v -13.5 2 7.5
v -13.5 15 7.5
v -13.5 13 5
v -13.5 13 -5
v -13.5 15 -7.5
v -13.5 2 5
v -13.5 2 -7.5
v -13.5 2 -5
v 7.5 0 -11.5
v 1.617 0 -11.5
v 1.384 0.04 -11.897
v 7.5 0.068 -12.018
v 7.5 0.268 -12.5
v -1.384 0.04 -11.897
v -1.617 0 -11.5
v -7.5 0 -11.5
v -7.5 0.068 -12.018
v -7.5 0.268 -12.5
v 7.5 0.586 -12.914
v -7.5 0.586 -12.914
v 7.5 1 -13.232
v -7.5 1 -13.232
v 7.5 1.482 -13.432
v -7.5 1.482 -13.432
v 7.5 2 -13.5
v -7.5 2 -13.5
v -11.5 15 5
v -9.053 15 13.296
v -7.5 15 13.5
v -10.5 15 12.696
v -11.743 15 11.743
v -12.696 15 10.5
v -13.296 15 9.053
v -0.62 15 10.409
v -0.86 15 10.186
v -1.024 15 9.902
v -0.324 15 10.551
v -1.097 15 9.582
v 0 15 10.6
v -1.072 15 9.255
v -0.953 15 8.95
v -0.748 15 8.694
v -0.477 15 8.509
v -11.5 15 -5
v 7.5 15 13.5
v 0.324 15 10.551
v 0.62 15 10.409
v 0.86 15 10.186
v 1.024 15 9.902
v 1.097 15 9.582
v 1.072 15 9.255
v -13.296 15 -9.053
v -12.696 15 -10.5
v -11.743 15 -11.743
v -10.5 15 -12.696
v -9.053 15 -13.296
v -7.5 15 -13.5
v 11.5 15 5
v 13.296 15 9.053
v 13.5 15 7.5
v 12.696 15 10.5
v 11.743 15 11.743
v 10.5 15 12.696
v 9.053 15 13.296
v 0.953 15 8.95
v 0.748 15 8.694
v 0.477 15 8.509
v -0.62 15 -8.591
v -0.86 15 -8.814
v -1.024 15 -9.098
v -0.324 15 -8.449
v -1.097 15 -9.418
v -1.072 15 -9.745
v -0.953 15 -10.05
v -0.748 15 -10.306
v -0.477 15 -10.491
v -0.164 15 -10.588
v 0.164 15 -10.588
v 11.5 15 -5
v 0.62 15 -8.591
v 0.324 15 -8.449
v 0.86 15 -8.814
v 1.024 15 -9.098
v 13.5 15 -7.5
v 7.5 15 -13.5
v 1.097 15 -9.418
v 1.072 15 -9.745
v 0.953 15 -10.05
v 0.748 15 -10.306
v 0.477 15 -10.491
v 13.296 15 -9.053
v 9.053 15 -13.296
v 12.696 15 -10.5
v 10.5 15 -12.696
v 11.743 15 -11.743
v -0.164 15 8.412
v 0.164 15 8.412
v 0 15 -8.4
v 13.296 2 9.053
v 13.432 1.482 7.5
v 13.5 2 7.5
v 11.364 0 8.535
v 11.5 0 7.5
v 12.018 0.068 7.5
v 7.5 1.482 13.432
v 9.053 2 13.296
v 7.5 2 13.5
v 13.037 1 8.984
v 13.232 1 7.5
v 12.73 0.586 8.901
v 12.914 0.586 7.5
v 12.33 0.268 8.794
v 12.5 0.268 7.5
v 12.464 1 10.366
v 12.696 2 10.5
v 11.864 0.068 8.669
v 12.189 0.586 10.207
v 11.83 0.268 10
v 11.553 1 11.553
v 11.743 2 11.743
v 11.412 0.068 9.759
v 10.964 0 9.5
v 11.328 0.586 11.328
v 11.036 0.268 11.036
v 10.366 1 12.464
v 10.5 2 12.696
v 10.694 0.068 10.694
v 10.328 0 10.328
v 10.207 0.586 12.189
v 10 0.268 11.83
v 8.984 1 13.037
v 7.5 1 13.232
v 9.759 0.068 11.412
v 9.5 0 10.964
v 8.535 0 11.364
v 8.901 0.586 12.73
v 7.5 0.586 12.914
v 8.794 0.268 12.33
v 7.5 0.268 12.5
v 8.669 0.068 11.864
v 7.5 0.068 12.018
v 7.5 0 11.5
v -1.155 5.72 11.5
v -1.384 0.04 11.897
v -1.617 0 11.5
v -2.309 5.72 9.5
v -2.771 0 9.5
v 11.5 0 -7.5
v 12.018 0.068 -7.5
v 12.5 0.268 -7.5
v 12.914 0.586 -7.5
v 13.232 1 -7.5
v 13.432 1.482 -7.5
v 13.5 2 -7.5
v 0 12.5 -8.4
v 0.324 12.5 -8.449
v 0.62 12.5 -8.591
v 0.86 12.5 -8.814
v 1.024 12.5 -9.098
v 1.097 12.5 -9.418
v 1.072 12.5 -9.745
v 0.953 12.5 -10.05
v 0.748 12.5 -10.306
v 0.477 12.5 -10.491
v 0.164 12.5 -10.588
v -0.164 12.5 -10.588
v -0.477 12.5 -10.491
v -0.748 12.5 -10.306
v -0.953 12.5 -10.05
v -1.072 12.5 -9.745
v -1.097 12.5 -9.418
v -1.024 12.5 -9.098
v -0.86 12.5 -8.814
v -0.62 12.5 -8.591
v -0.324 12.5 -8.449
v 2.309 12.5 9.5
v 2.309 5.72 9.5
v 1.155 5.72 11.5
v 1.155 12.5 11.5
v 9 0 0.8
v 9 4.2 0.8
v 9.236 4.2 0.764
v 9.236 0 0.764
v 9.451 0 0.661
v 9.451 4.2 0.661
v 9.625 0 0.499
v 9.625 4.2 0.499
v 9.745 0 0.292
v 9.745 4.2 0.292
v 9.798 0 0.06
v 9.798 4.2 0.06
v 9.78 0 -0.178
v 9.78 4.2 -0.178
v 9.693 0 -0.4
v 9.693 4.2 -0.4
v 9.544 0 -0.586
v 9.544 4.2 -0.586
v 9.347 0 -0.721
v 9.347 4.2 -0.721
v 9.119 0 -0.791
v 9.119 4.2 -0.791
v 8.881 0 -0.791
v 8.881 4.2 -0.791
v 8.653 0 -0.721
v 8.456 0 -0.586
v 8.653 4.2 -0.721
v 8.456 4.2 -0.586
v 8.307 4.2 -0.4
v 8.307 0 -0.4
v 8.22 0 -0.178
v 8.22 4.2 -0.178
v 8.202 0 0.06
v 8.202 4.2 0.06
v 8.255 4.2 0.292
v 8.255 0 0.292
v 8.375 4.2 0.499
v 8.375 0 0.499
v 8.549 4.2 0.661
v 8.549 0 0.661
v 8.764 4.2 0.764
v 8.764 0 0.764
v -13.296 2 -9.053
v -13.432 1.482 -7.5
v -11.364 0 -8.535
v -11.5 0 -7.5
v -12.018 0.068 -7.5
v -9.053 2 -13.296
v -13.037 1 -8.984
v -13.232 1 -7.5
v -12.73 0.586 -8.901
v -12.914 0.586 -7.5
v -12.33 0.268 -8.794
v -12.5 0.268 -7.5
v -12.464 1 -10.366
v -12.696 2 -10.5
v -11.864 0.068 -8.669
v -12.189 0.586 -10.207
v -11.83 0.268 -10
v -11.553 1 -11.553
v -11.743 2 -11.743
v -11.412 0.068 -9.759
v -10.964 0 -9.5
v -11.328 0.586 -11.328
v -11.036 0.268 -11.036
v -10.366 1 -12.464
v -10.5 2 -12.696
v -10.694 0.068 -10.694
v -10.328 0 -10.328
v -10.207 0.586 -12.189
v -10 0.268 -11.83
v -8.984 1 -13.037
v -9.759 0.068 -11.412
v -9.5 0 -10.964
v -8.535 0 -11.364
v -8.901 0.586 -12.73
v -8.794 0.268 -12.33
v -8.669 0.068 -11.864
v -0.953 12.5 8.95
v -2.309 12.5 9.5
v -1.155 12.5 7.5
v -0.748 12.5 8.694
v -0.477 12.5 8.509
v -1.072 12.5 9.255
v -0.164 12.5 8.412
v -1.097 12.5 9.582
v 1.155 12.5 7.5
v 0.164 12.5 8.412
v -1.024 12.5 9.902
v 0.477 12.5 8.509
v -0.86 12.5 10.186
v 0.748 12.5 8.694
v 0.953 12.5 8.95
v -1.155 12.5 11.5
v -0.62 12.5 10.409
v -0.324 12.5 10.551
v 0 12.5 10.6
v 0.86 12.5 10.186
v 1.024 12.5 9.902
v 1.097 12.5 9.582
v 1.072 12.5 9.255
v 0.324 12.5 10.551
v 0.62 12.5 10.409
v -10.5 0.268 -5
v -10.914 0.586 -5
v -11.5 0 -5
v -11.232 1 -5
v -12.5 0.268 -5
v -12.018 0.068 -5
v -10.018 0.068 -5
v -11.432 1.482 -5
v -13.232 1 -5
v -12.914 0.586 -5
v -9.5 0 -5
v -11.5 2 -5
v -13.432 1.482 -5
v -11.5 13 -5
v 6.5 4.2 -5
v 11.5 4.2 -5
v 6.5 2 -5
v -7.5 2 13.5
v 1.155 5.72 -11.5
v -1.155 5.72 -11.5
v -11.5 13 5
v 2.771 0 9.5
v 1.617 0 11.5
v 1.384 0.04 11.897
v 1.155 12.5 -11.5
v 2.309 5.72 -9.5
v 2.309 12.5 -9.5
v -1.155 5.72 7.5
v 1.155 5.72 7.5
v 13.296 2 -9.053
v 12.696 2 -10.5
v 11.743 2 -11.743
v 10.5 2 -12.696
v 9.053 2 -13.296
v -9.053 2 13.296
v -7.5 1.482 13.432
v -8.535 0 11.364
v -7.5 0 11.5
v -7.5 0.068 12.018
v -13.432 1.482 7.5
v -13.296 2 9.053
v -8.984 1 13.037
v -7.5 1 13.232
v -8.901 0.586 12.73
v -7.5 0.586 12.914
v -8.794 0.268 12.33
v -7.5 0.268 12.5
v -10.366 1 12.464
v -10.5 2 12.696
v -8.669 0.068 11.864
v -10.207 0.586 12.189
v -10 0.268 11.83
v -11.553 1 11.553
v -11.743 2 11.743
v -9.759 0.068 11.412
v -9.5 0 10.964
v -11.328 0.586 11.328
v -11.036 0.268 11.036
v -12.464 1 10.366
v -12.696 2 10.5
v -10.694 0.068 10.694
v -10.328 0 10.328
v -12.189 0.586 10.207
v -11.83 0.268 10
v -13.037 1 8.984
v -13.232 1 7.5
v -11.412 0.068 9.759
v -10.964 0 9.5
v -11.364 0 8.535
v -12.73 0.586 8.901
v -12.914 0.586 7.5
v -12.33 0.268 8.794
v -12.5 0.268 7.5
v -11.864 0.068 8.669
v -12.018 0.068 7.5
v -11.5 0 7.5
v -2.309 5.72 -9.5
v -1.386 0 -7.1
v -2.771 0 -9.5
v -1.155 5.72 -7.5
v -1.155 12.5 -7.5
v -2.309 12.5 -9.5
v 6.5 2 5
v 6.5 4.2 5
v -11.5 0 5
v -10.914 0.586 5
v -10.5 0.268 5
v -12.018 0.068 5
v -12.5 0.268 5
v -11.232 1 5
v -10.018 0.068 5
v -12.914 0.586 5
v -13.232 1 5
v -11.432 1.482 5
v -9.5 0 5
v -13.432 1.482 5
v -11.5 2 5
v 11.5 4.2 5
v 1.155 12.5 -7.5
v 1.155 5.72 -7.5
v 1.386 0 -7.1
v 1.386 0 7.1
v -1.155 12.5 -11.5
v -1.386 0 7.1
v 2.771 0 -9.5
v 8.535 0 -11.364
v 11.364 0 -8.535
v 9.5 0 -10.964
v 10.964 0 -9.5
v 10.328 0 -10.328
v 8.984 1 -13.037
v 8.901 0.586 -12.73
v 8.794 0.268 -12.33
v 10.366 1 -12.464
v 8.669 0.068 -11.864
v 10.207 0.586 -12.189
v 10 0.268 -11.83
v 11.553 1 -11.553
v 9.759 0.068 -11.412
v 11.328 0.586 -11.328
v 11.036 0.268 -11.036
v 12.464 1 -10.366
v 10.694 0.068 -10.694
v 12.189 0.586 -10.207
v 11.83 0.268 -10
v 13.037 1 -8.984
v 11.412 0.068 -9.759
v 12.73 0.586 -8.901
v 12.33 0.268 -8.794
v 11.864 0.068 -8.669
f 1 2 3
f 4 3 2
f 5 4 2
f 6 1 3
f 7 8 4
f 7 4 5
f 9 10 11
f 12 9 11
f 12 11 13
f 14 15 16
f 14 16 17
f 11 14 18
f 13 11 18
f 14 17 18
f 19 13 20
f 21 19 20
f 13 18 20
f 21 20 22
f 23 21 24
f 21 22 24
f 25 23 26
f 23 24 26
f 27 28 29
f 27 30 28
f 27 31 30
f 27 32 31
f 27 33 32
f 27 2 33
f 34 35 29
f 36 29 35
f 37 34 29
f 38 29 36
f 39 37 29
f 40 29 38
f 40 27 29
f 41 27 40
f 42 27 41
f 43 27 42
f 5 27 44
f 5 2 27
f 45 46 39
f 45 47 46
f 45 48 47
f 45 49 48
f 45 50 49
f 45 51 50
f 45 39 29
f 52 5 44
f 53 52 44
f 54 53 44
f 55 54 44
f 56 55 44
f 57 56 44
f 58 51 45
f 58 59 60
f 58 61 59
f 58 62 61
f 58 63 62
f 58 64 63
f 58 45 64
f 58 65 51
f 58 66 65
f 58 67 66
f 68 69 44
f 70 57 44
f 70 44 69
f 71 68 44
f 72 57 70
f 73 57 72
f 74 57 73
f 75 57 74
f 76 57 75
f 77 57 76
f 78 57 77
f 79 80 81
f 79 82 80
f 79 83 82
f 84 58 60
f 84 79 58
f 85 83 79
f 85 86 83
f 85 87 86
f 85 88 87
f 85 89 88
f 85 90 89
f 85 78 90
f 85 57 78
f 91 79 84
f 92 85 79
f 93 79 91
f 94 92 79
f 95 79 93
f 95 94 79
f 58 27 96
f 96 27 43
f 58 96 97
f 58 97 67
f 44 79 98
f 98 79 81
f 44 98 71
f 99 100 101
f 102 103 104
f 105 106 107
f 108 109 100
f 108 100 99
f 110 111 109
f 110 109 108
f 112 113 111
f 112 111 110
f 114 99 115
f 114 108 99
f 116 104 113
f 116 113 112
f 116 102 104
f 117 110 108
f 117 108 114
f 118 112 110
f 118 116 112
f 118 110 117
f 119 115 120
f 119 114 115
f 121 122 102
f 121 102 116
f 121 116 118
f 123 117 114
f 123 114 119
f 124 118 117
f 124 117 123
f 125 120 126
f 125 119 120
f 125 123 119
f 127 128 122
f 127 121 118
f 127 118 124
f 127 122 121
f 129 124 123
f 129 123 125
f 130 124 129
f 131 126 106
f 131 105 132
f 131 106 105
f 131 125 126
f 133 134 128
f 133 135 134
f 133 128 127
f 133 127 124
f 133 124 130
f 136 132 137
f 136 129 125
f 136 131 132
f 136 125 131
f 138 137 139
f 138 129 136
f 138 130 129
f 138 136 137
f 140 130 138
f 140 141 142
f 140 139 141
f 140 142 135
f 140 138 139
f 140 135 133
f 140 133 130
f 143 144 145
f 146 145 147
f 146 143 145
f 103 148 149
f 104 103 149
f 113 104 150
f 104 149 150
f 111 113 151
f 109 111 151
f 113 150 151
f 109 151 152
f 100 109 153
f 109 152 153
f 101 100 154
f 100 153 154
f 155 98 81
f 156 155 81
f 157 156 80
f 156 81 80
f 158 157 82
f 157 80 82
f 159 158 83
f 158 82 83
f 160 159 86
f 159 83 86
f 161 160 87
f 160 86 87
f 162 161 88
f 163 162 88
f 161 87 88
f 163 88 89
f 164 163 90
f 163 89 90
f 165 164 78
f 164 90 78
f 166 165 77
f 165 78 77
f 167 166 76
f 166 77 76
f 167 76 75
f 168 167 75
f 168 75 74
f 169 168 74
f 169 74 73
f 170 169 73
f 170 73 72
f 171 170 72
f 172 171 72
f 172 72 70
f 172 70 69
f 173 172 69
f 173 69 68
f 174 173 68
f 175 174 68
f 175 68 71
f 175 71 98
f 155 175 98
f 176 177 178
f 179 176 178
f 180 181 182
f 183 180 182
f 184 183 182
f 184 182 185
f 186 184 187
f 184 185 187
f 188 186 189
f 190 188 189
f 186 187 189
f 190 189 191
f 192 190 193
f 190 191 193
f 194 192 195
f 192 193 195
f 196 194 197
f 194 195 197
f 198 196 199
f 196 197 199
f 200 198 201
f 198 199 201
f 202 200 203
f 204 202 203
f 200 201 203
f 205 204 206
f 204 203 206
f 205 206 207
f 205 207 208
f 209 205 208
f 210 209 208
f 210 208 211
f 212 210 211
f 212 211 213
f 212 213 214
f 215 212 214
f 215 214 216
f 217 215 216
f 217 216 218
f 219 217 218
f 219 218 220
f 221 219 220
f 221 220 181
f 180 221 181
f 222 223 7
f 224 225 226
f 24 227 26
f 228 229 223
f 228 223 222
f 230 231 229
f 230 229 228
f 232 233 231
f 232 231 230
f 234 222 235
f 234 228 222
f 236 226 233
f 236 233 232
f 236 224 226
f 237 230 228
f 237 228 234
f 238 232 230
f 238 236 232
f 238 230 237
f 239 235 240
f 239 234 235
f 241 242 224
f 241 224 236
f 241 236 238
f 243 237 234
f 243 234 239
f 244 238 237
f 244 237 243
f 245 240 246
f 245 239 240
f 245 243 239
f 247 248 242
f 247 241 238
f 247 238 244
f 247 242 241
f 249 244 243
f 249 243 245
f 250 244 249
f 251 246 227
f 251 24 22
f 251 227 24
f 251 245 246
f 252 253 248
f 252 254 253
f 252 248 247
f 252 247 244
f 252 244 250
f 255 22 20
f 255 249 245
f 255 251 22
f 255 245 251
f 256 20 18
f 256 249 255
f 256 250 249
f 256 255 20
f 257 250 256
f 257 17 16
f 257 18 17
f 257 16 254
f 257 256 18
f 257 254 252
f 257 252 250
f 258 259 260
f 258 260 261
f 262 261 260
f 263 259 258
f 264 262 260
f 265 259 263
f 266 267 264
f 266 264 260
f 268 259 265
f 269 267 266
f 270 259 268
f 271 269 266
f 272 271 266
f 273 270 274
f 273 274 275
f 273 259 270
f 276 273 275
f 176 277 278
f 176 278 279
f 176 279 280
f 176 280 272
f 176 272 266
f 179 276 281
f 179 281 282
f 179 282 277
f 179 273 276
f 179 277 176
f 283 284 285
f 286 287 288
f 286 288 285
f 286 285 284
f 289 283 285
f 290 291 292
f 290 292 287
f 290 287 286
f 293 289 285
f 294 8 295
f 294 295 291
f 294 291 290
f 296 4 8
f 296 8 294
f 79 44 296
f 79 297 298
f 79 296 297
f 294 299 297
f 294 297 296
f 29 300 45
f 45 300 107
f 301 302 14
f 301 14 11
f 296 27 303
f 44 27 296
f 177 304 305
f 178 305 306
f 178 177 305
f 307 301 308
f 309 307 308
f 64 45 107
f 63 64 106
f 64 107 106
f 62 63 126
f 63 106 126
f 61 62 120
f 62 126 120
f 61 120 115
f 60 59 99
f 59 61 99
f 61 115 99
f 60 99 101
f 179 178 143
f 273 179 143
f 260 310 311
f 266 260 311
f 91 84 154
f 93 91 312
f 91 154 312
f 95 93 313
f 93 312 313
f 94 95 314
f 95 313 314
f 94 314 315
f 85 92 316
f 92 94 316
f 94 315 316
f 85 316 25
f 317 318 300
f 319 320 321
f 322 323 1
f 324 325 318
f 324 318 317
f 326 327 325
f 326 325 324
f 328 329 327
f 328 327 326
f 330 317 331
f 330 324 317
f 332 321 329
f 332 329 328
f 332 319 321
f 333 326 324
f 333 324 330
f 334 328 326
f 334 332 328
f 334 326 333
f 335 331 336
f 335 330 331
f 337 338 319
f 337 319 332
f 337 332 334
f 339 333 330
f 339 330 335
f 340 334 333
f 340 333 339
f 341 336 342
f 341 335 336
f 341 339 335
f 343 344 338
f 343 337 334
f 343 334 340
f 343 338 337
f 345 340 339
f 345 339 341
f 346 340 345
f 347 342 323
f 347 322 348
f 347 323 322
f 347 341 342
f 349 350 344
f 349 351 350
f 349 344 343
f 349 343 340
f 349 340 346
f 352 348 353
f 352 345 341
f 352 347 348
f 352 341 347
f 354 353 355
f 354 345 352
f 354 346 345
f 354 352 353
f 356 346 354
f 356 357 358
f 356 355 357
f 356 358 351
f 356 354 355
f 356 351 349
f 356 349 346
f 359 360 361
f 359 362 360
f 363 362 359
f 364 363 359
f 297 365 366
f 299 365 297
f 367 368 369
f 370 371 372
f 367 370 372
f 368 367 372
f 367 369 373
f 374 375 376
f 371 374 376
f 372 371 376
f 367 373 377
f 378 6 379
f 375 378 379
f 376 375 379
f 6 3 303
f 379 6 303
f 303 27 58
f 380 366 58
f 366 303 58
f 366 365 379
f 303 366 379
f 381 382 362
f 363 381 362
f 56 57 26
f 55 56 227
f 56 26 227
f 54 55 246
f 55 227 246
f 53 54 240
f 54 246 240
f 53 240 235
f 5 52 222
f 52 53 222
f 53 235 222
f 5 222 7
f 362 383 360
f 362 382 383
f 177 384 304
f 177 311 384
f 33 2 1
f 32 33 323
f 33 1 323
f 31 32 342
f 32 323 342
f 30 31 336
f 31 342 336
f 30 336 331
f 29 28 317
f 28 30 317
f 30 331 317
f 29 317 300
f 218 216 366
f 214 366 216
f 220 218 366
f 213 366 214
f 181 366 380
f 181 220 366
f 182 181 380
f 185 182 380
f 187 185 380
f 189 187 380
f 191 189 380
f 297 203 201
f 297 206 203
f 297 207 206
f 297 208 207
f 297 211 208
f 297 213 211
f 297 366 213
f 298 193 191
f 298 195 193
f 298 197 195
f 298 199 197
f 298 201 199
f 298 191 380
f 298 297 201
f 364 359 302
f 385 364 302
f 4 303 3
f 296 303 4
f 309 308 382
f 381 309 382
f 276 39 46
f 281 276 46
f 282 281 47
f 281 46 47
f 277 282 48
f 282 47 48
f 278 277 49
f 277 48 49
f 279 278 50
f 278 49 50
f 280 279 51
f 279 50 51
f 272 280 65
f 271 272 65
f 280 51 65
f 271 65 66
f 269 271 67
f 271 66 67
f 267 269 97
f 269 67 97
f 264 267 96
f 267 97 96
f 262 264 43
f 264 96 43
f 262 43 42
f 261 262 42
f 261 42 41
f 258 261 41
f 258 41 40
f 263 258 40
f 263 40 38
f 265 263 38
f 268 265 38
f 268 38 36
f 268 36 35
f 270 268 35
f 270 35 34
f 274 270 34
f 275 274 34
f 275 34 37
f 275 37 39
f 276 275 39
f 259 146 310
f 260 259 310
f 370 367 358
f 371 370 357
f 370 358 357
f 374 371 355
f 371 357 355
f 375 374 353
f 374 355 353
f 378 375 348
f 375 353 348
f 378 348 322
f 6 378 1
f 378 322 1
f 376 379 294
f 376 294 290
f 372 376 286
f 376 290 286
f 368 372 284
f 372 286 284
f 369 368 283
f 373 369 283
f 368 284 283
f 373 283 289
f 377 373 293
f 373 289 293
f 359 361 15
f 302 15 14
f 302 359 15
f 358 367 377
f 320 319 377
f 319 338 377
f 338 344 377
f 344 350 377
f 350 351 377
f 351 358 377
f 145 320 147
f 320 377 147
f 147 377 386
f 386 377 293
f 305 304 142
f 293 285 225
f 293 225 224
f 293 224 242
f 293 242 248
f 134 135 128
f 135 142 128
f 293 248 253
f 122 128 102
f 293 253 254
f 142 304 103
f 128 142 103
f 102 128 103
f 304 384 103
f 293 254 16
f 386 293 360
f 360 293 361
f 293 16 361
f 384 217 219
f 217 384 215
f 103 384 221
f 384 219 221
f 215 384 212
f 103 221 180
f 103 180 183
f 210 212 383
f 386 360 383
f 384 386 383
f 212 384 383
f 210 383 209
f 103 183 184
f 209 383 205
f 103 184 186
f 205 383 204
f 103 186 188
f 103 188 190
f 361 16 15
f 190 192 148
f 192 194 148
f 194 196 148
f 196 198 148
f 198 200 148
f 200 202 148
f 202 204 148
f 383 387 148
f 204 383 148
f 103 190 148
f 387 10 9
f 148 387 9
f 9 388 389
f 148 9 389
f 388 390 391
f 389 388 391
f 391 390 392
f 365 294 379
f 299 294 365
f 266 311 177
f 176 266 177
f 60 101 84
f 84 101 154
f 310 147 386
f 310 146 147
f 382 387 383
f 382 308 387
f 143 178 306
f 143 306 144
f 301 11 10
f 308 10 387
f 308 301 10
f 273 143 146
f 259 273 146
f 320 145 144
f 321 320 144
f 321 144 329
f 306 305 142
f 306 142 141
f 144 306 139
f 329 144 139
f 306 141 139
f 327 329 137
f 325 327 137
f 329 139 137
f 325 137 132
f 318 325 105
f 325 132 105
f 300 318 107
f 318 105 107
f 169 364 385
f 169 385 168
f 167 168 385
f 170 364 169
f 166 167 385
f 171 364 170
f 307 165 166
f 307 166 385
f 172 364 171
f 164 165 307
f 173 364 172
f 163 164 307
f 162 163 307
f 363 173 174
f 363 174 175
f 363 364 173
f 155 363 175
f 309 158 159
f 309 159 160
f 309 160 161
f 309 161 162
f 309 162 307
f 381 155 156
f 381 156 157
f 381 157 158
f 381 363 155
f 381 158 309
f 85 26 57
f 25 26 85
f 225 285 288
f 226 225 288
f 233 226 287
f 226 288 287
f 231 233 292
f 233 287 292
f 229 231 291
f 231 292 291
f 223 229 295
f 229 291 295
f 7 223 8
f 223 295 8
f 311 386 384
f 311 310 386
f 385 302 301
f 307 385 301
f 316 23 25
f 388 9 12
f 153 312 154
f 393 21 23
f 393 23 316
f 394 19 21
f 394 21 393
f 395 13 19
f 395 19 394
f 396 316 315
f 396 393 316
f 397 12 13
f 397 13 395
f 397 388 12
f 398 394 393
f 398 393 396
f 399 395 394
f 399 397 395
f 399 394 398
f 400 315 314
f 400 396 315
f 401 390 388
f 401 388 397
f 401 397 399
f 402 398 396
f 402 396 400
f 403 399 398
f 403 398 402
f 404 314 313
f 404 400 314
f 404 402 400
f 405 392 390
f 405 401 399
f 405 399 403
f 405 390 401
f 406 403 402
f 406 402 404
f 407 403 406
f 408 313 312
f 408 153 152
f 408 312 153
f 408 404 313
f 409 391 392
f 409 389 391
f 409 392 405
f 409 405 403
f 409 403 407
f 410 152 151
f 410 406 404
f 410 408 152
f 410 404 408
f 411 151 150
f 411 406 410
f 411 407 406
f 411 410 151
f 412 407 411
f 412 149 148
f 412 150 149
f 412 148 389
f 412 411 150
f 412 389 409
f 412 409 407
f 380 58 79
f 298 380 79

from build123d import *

# Parameters (mm, degrees)
ESQUISSE1_W             = 27
ESQUISSE1_H             = 27
BOSS_EXTRU_1_DEPTH      = 15
ESQUISSE2_W             = 23
ESQUISSE2_H             = 10
ENL_V_MAT_EXTRU_1_DEPTH = 13
ESQUISSE3_W             = 5
ESQUISSE3_H             = 10
BOSS_EXTRU_2_DEPTH      = 2.2
ESQUISSE4_R             = 0.8
ENL_V_MAT_EXTRU_2_DEPTH = 22.934903693
ENL_V_MAT_EXTRU_3_REACH = 34.129
ESQUISSE5_W             = 10
ESQUISSE5_H             = 11
ENL_V_MAT_EXTRU_4_REACH = 25.098
ESQUISSE6_W             = 2
ESQUISSE6_H             = 10
ESQUISSE7_R             = 1.1
ENL_V_MAT_EXTRU_5_DEPTH = 25.279621084
ENL_V_MAT_EXTRU_6_DEPTH = 12.5
CONG_1_R                = 6
CONG_1_R_2              = 2


with BuildPart() as part:
    # Esquisse1 → Boss.-Extru.1 (new body)
    with BuildSketch(Plane(origin=(0, 0, 0), x_dir=(1, 0, 0), z_dir=(0, 1, 0))):
        Rectangle(ESQUISSE1_W, ESQUISSE1_H)
    extrude(amount=BOSS_EXTRU_1_DEPTH)

    # Esquisse2 → Enlèv. mat.-Extru.1 (cut)
    with BuildSketch(Plane(origin=(0, 15, 0), x_dir=(1, 0, 0), z_dir=(0, 1, 0))):
        Rectangle(ESQUISSE2_W, ESQUISSE2_H)
    extrude(amount=-ENL_V_MAT_EXTRU_1_DEPTH, mode=Mode.SUBTRACT)

    # Esquisse3 → Boss.-Extru.2 (add)
    with BuildSketch(Plane(origin=(0, 2, 0), x_dir=(1, 0, 0), z_dir=(0, 1, 0))):
        with Locations((9, 0)):
            Rectangle(ESQUISSE3_W, ESQUISSE3_H)
    extrude(amount=BOSS_EXTRU_2_DEPTH)

    # Esquisse4 → Enlèv. mat.-Extru.2 (cut, through all)
    with BuildSketch(Plane(origin=(0, 4.2, 0), x_dir=(1, 0, 0), z_dir=(0, 1, 0))):
        with Locations(Location((9, 0, 0), (0, 0, 270))):
            Circle(ESQUISSE4_R)
    extrude(amount=-ENL_V_MAT_EXTRU_2_DEPTH, mode=Mode.SUBTRACT)

    # Esquisse5 → Enlèv. mat.-Extru.3 (cut, up to next)
    with BuildSketch(Plane(origin=(-11.5, 0, 0), x_dir=(0, 0, -1), z_dir=(1, 0, 0)), mode=Mode.PRIVATE) as enl_v_mat_extru_3_sk1:
        with Locations((0, 7.5)):
            Rectangle(ESQUISSE5_W, ESQUISSE5_H)
    enl_v_mat_extru_3_tool1 = extrude(enl_v_mat_extru_3_sk1.sketch, amount=-ENL_V_MAT_EXTRU_3_REACH, mode=Mode.PRIVATE) & part.part
    add(enl_v_mat_extru_3_tool1.solids().sort_by_distance((-11.5, 7.5, 0))[0], mode=Mode.SUBTRACT)

    # Esquisse6 → Enlèv. mat.-Extru.4 (cut, up to next)
    with BuildSketch(Plane(origin=(0, 2, 0), x_dir=(1, 0, 0), z_dir=(0, 1, 0)), mode=Mode.PRIVATE) as enl_v_mat_extru_4_sk1:
        with Locations((-12.5, 0)):
            Rectangle(ESQUISSE6_W, ESQUISSE6_H)
    enl_v_mat_extru_4_tool1 = extrude(enl_v_mat_extru_4_sk1.sketch, amount=-ENL_V_MAT_EXTRU_4_REACH, mode=Mode.PRIVATE) & part.part
    add(enl_v_mat_extru_4_tool1.solids().sort_by_distance((-12.5, 2, 0))[0], mode=Mode.SUBTRACT)

    # Esquisse7 → Enlèv. mat.-Extru.5 (cut, through all)
    with BuildSketch(Plane(origin=(0, 15, 0), x_dir=(1, 0, 0), z_dir=(0, 1, 0))):
        with Locations(Location((0, -9.5, 0), (0, 0, 270))):
            Circle(ESQUISSE7_R)
        with Locations(Location((0, 9.5, 0), (0, 0, 270))):
            Circle(ESQUISSE7_R)
    extrude(amount=-ENL_V_MAT_EXTRU_5_DEPTH, mode=Mode.SUBTRACT)

    # Esquisse8 → Enlèv. mat.-Extru.6 (cut)
    with BuildSketch(Plane.XZ):
        Polygon((2.309401077, -9.5), (1.154700538, -7.5), (-1.154700538, -7.5), (-2.309401077, -9.5), (-1.154700538, -11.5), (1.154700538, -11.5), align=None)
        Polygon((2.309401077, 9.5), (1.154700538, 11.5), (-1.154700538, 11.5), (-2.309401077, 9.5), (-1.154700538, 7.5), (1.154700538, 7.5), align=None)
    extrude(amount=-ENL_V_MAT_EXTRU_6_DEPTH, mode=Mode.SUBTRACT)

    # Enlèv. mat.-Extru.7: read off the stored shape, not the designer's step
    # Enlèv. mat.-Extru.7: loft between two sections, ruled curve by curve
    enl_v_mat_extru_7_from = [
        Edge.make_line((2.771281292, 0, -9.5), (1.385640646, 0, -7.1)),
        Edge.make_line((1.385640646, 0, -7.1), (-1.385640646, 0, -7.1)),
        Edge.make_line((-1.385640646, 0, -7.1), (-2.771281292, 0, -9.5)),
        Edge.make_line((-2.771281292, 0, -9.5), (-1.385640646, 0, -11.9)),
        Edge.make_line((-1.385640646, 0, -11.9), (1.385640646, 0, -11.9)),
        Edge.make_line((1.385640646, 0, -11.9), (2.771281292, 0, -9.5)),
    ]
    enl_v_mat_extru_7_to = [
        Edge.make_line((2.309401077, 5.720266503, -9.5), (1.154700538, 5.720266503, -7.5)),
        Edge.make_line((1.154700538, 5.720266503, -7.5), (-1.154700538, 5.720266503, -7.5)),
        Edge.make_line((-1.154700538, 5.720266503, -7.5), (-2.309401077, 5.720266503, -9.5)),
        Edge.make_line((-2.309401077, 5.720266503, -9.5), (-1.154700538, 5.720266503, -11.5)),
        Edge.make_line((-1.154700538, 5.720266503, -11.5), (1.154700538, 5.720266503, -11.5)),
        Edge.make_line((1.154700538, 5.720266503, -11.5), (2.309401077, 5.720266503, -9.5)),
    ]
    enl_v_mat_extru_7 = Solid(Shell([*[Face.make_surface_from_curves(enl_v_mat_extru_7_from[k], enl_v_mat_extru_7_to[k]) for k in range(6)], Face(Wire(enl_v_mat_extru_7_from)), Face(Wire(enl_v_mat_extru_7_to))]))
    add(enl_v_mat_extru_7, mode=Mode.SUBTRACT)

    # Enl_v. mat.-Extru.7 2: loft between two sections, ruled curve by curve
    enl_v_mat_extru_7_2_from = [
        Edge.make_line((2.771281292, 0, 9.5), (1.385640646, 0, 11.9)),
        Edge.make_line((1.385640646, 0, 11.9), (-1.385640646, 0, 11.9)),
        Edge.make_line((-1.385640646, 0, 11.9), (-2.771281292, 0, 9.5)),
        Edge.make_line((-2.771281292, 0, 9.5), (-1.385640646, 0, 7.1)),
        Edge.make_line((-1.385640646, 0, 7.1), (1.385640646, 0, 7.1)),
        Edge.make_line((1.385640646, 0, 7.1), (2.771281292, 0, 9.5)),
    ]
    enl_v_mat_extru_7_2_to = [
        Edge.make_line((2.309401077, 5.720266503, 9.5), (1.154700538, 5.720266503, 11.5)),
        Edge.make_line((1.154700538, 5.720266503, 11.5), (-1.154700538, 5.720266503, 11.5)),
        Edge.make_line((-1.154700538, 5.720266503, 11.5), (-2.309401077, 5.720266503, 9.5)),
        Edge.make_line((-2.309401077, 5.720266503, 9.5), (-1.154700538, 5.720266503, 7.5)),
        Edge.make_line((-1.154700538, 5.720266503, 7.5), (1.154700538, 5.720266503, 7.5)),
        Edge.make_line((1.154700538, 5.720266503, 7.5), (2.309401077, 5.720266503, 9.5)),
    ]
    enl_v_mat_extru_7_2 = Solid(Shell([*[Face.make_surface_from_curves(enl_v_mat_extru_7_2_from[k], enl_v_mat_extru_7_2_to[k]) for k in range(6)], Face(Wire(enl_v_mat_extru_7_2_from)), Face(Wire(enl_v_mat_extru_7_2_to))]))
    add(enl_v_mat_extru_7_2, mode=Mode.SUBTRACT)

    # Congé1
    # the kernel refuses this fillet: 6, 2 mm, written as the material it takes off along each edge
    with BuildSketch(Plane(origin=(13.5, -15, -13.5), x_dir=(-1, 0, 0), z_dir=(0, 1, 0)), Plane(origin=(13.5, -15, 13.5), x_dir=(0, 0, -1), z_dir=(0, 1, 0))) as cong_1_piece_1:
        with BuildLine():
            CenterArc((CONG_1_R, CONG_1_R), CONG_1_R, 180, 90)
            Line((0, CONG_1_R), (0, 0))
            Line((0, 0), (CONG_1_R, 0))
        make_face()
    extrude(amount=45, mode=Mode.SUBTRACT)
    with BuildSketch(Plane(origin=(-13.5, -15, 13.5), x_dir=(0, 0, -1), z_dir=(0, 1, 0)), Plane(origin=(-13.5, -15, -13.5), x_dir=(1, 0, 0), z_dir=(0, 1, 0))) as cong_1_piece_2:
        with BuildLine():
            CenterArc((CONG_1_R, -CONG_1_R), CONG_1_R, 90, 90)
            Line((0, -CONG_1_R), (0, 0))
            Line((0, 0), (CONG_1_R, 0))
        make_face()
    extrude(amount=45, mode=Mode.SUBTRACT)
    with BuildSketch(Plane(origin=(-11.5, 0, -5), x_dir=(1, 0, 0), z_dir=(0, 0, 1))) as cong_1_piece_3:
        with BuildLine():
            CenterArc((CONG_1_R_2, CONG_1_R_2), CONG_1_R_2, 180, 90)
            Line((0, CONG_1_R_2), (0, 0))
            Line((0, 0), (CONG_1_R_2, 0))
        make_face()
    extrude(amount=10, mode=Mode.SUBTRACT)
    # the kernel refuses this fillet: 6, 2 mm, written as the material it takes off along each edge
    with BuildSketch(Plane(origin=(13.5, 0, -7.5), x_dir=(0, 1, 0), z_dir=(0, 0, 1)), Plane(origin=(-7.5, 0, -13.5), x_dir=(0, 1, 0), z_dir=(1, 0, 0)), Plane(origin=(7.5, 0, 13.5), x_dir=(0, 1, 0), z_dir=(-1, 0, 0))) as cong_1_2_piece_1:
        with BuildLine():
            CenterArc((CONG_1_R_2, CONG_1_R_2), CONG_1_R_2, 180, 90)
            Line((0, CONG_1_R_2), (0, 0))
            Line((0, 0), (CONG_1_R_2, 0))
        make_face()
    extrude(amount=15, mode=Mode.SUBTRACT)
    with BuildSketch(Plane(origin=(-13.5, 0, 0), x_dir=(0, 1, 0), z_dir=(0, 0, -1)), Plane(origin=(-13.5, 0, 7.5), x_dir=(0, 1, 0), z_dir=(0, 0, -1))) as cong_1_2_piece_2:
        with BuildLine():
            CenterArc((CONG_1_R_2, CONG_1_R_2), CONG_1_R_2, 180, 90)
            Line((0, CONG_1_R_2), (0, 0))
            Line((0, 0), (CONG_1_R_2, 0))
        make_face()
    extrude(amount=7.5, mode=Mode.SUBTRACT)
    with BuildSketch(Plane(origin=(-7.5, 0, 7.5), x_dir=(0, 0, 1), z_dir=(1, 0, 0))) as cong_1_2_piece_3:
        with BuildLine():
            CenterArc((6 - CONG_1_R_2, -CONG_1_R_2), CONG_1_R_2, 0, 90)
            Line((6 - CONG_1_R_2, 0), (6, 0))
            Line((6, 0), (6, -CONG_1_R_2))
        make_face()
    revolve(axis=Axis((-7.5, 0, 7.5), (0, -1, 0)), revolution_arc=90, mode=Mode.SUBTRACT)
    with BuildSketch(Plane(origin=(-7.5, 0, -7.5), x_dir=(-1, 0, 0), z_dir=(0, 0, 1))) as cong_1_2_piece_4:
        with BuildLine():
            CenterArc((6 - CONG_1_R_2, -CONG_1_R_2), CONG_1_R_2, 0, 90)
            Line((6 - CONG_1_R_2, 0), (6, 0))
            Line((6, 0), (6, -CONG_1_R_2))
        make_face()
    revolve(axis=Axis((-7.5, 0, -7.5), (0, -1, 0)), revolution_arc=90, mode=Mode.SUBTRACT)
    with BuildSketch(Plane(origin=(7.5, 0, 7.5), x_dir=(1, 0, 0), z_dir=(0, 0, -1))) as cong_1_2_piece_5:
        with BuildLine():
            CenterArc((6 - CONG_1_R_2, -CONG_1_R_2), CONG_1_R_2, 0, 90)
            Line((6 - CONG_1_R_2, 0), (6, 0))
            Line((6, 0), (6, -CONG_1_R_2))
        make_face()
    revolve(axis=Axis((7.5, 0, 7.5), (0, -1, 0)), revolution_arc=90, mode=Mode.SUBTRACT)
    with BuildSketch(Plane(origin=(7.5, 0, -7.5), x_dir=(0, 0, -1), z_dir=(-1, 0, 0))) as cong_1_2_piece_6:
        with BuildLine():
            CenterArc((6 - CONG_1_R_2, -CONG_1_R_2), CONG_1_R_2, 0, 90)
            Line((6 - CONG_1_R_2, 0), (6, 0))
            Line((6, 0), (6, -CONG_1_R_2))
        make_face()
    revolve(axis=Axis((7.5, 0, -7.5), (0, -1, 0)), revolution_arc=90, mode=Mode.SUBTRACT)


solid = part.part
